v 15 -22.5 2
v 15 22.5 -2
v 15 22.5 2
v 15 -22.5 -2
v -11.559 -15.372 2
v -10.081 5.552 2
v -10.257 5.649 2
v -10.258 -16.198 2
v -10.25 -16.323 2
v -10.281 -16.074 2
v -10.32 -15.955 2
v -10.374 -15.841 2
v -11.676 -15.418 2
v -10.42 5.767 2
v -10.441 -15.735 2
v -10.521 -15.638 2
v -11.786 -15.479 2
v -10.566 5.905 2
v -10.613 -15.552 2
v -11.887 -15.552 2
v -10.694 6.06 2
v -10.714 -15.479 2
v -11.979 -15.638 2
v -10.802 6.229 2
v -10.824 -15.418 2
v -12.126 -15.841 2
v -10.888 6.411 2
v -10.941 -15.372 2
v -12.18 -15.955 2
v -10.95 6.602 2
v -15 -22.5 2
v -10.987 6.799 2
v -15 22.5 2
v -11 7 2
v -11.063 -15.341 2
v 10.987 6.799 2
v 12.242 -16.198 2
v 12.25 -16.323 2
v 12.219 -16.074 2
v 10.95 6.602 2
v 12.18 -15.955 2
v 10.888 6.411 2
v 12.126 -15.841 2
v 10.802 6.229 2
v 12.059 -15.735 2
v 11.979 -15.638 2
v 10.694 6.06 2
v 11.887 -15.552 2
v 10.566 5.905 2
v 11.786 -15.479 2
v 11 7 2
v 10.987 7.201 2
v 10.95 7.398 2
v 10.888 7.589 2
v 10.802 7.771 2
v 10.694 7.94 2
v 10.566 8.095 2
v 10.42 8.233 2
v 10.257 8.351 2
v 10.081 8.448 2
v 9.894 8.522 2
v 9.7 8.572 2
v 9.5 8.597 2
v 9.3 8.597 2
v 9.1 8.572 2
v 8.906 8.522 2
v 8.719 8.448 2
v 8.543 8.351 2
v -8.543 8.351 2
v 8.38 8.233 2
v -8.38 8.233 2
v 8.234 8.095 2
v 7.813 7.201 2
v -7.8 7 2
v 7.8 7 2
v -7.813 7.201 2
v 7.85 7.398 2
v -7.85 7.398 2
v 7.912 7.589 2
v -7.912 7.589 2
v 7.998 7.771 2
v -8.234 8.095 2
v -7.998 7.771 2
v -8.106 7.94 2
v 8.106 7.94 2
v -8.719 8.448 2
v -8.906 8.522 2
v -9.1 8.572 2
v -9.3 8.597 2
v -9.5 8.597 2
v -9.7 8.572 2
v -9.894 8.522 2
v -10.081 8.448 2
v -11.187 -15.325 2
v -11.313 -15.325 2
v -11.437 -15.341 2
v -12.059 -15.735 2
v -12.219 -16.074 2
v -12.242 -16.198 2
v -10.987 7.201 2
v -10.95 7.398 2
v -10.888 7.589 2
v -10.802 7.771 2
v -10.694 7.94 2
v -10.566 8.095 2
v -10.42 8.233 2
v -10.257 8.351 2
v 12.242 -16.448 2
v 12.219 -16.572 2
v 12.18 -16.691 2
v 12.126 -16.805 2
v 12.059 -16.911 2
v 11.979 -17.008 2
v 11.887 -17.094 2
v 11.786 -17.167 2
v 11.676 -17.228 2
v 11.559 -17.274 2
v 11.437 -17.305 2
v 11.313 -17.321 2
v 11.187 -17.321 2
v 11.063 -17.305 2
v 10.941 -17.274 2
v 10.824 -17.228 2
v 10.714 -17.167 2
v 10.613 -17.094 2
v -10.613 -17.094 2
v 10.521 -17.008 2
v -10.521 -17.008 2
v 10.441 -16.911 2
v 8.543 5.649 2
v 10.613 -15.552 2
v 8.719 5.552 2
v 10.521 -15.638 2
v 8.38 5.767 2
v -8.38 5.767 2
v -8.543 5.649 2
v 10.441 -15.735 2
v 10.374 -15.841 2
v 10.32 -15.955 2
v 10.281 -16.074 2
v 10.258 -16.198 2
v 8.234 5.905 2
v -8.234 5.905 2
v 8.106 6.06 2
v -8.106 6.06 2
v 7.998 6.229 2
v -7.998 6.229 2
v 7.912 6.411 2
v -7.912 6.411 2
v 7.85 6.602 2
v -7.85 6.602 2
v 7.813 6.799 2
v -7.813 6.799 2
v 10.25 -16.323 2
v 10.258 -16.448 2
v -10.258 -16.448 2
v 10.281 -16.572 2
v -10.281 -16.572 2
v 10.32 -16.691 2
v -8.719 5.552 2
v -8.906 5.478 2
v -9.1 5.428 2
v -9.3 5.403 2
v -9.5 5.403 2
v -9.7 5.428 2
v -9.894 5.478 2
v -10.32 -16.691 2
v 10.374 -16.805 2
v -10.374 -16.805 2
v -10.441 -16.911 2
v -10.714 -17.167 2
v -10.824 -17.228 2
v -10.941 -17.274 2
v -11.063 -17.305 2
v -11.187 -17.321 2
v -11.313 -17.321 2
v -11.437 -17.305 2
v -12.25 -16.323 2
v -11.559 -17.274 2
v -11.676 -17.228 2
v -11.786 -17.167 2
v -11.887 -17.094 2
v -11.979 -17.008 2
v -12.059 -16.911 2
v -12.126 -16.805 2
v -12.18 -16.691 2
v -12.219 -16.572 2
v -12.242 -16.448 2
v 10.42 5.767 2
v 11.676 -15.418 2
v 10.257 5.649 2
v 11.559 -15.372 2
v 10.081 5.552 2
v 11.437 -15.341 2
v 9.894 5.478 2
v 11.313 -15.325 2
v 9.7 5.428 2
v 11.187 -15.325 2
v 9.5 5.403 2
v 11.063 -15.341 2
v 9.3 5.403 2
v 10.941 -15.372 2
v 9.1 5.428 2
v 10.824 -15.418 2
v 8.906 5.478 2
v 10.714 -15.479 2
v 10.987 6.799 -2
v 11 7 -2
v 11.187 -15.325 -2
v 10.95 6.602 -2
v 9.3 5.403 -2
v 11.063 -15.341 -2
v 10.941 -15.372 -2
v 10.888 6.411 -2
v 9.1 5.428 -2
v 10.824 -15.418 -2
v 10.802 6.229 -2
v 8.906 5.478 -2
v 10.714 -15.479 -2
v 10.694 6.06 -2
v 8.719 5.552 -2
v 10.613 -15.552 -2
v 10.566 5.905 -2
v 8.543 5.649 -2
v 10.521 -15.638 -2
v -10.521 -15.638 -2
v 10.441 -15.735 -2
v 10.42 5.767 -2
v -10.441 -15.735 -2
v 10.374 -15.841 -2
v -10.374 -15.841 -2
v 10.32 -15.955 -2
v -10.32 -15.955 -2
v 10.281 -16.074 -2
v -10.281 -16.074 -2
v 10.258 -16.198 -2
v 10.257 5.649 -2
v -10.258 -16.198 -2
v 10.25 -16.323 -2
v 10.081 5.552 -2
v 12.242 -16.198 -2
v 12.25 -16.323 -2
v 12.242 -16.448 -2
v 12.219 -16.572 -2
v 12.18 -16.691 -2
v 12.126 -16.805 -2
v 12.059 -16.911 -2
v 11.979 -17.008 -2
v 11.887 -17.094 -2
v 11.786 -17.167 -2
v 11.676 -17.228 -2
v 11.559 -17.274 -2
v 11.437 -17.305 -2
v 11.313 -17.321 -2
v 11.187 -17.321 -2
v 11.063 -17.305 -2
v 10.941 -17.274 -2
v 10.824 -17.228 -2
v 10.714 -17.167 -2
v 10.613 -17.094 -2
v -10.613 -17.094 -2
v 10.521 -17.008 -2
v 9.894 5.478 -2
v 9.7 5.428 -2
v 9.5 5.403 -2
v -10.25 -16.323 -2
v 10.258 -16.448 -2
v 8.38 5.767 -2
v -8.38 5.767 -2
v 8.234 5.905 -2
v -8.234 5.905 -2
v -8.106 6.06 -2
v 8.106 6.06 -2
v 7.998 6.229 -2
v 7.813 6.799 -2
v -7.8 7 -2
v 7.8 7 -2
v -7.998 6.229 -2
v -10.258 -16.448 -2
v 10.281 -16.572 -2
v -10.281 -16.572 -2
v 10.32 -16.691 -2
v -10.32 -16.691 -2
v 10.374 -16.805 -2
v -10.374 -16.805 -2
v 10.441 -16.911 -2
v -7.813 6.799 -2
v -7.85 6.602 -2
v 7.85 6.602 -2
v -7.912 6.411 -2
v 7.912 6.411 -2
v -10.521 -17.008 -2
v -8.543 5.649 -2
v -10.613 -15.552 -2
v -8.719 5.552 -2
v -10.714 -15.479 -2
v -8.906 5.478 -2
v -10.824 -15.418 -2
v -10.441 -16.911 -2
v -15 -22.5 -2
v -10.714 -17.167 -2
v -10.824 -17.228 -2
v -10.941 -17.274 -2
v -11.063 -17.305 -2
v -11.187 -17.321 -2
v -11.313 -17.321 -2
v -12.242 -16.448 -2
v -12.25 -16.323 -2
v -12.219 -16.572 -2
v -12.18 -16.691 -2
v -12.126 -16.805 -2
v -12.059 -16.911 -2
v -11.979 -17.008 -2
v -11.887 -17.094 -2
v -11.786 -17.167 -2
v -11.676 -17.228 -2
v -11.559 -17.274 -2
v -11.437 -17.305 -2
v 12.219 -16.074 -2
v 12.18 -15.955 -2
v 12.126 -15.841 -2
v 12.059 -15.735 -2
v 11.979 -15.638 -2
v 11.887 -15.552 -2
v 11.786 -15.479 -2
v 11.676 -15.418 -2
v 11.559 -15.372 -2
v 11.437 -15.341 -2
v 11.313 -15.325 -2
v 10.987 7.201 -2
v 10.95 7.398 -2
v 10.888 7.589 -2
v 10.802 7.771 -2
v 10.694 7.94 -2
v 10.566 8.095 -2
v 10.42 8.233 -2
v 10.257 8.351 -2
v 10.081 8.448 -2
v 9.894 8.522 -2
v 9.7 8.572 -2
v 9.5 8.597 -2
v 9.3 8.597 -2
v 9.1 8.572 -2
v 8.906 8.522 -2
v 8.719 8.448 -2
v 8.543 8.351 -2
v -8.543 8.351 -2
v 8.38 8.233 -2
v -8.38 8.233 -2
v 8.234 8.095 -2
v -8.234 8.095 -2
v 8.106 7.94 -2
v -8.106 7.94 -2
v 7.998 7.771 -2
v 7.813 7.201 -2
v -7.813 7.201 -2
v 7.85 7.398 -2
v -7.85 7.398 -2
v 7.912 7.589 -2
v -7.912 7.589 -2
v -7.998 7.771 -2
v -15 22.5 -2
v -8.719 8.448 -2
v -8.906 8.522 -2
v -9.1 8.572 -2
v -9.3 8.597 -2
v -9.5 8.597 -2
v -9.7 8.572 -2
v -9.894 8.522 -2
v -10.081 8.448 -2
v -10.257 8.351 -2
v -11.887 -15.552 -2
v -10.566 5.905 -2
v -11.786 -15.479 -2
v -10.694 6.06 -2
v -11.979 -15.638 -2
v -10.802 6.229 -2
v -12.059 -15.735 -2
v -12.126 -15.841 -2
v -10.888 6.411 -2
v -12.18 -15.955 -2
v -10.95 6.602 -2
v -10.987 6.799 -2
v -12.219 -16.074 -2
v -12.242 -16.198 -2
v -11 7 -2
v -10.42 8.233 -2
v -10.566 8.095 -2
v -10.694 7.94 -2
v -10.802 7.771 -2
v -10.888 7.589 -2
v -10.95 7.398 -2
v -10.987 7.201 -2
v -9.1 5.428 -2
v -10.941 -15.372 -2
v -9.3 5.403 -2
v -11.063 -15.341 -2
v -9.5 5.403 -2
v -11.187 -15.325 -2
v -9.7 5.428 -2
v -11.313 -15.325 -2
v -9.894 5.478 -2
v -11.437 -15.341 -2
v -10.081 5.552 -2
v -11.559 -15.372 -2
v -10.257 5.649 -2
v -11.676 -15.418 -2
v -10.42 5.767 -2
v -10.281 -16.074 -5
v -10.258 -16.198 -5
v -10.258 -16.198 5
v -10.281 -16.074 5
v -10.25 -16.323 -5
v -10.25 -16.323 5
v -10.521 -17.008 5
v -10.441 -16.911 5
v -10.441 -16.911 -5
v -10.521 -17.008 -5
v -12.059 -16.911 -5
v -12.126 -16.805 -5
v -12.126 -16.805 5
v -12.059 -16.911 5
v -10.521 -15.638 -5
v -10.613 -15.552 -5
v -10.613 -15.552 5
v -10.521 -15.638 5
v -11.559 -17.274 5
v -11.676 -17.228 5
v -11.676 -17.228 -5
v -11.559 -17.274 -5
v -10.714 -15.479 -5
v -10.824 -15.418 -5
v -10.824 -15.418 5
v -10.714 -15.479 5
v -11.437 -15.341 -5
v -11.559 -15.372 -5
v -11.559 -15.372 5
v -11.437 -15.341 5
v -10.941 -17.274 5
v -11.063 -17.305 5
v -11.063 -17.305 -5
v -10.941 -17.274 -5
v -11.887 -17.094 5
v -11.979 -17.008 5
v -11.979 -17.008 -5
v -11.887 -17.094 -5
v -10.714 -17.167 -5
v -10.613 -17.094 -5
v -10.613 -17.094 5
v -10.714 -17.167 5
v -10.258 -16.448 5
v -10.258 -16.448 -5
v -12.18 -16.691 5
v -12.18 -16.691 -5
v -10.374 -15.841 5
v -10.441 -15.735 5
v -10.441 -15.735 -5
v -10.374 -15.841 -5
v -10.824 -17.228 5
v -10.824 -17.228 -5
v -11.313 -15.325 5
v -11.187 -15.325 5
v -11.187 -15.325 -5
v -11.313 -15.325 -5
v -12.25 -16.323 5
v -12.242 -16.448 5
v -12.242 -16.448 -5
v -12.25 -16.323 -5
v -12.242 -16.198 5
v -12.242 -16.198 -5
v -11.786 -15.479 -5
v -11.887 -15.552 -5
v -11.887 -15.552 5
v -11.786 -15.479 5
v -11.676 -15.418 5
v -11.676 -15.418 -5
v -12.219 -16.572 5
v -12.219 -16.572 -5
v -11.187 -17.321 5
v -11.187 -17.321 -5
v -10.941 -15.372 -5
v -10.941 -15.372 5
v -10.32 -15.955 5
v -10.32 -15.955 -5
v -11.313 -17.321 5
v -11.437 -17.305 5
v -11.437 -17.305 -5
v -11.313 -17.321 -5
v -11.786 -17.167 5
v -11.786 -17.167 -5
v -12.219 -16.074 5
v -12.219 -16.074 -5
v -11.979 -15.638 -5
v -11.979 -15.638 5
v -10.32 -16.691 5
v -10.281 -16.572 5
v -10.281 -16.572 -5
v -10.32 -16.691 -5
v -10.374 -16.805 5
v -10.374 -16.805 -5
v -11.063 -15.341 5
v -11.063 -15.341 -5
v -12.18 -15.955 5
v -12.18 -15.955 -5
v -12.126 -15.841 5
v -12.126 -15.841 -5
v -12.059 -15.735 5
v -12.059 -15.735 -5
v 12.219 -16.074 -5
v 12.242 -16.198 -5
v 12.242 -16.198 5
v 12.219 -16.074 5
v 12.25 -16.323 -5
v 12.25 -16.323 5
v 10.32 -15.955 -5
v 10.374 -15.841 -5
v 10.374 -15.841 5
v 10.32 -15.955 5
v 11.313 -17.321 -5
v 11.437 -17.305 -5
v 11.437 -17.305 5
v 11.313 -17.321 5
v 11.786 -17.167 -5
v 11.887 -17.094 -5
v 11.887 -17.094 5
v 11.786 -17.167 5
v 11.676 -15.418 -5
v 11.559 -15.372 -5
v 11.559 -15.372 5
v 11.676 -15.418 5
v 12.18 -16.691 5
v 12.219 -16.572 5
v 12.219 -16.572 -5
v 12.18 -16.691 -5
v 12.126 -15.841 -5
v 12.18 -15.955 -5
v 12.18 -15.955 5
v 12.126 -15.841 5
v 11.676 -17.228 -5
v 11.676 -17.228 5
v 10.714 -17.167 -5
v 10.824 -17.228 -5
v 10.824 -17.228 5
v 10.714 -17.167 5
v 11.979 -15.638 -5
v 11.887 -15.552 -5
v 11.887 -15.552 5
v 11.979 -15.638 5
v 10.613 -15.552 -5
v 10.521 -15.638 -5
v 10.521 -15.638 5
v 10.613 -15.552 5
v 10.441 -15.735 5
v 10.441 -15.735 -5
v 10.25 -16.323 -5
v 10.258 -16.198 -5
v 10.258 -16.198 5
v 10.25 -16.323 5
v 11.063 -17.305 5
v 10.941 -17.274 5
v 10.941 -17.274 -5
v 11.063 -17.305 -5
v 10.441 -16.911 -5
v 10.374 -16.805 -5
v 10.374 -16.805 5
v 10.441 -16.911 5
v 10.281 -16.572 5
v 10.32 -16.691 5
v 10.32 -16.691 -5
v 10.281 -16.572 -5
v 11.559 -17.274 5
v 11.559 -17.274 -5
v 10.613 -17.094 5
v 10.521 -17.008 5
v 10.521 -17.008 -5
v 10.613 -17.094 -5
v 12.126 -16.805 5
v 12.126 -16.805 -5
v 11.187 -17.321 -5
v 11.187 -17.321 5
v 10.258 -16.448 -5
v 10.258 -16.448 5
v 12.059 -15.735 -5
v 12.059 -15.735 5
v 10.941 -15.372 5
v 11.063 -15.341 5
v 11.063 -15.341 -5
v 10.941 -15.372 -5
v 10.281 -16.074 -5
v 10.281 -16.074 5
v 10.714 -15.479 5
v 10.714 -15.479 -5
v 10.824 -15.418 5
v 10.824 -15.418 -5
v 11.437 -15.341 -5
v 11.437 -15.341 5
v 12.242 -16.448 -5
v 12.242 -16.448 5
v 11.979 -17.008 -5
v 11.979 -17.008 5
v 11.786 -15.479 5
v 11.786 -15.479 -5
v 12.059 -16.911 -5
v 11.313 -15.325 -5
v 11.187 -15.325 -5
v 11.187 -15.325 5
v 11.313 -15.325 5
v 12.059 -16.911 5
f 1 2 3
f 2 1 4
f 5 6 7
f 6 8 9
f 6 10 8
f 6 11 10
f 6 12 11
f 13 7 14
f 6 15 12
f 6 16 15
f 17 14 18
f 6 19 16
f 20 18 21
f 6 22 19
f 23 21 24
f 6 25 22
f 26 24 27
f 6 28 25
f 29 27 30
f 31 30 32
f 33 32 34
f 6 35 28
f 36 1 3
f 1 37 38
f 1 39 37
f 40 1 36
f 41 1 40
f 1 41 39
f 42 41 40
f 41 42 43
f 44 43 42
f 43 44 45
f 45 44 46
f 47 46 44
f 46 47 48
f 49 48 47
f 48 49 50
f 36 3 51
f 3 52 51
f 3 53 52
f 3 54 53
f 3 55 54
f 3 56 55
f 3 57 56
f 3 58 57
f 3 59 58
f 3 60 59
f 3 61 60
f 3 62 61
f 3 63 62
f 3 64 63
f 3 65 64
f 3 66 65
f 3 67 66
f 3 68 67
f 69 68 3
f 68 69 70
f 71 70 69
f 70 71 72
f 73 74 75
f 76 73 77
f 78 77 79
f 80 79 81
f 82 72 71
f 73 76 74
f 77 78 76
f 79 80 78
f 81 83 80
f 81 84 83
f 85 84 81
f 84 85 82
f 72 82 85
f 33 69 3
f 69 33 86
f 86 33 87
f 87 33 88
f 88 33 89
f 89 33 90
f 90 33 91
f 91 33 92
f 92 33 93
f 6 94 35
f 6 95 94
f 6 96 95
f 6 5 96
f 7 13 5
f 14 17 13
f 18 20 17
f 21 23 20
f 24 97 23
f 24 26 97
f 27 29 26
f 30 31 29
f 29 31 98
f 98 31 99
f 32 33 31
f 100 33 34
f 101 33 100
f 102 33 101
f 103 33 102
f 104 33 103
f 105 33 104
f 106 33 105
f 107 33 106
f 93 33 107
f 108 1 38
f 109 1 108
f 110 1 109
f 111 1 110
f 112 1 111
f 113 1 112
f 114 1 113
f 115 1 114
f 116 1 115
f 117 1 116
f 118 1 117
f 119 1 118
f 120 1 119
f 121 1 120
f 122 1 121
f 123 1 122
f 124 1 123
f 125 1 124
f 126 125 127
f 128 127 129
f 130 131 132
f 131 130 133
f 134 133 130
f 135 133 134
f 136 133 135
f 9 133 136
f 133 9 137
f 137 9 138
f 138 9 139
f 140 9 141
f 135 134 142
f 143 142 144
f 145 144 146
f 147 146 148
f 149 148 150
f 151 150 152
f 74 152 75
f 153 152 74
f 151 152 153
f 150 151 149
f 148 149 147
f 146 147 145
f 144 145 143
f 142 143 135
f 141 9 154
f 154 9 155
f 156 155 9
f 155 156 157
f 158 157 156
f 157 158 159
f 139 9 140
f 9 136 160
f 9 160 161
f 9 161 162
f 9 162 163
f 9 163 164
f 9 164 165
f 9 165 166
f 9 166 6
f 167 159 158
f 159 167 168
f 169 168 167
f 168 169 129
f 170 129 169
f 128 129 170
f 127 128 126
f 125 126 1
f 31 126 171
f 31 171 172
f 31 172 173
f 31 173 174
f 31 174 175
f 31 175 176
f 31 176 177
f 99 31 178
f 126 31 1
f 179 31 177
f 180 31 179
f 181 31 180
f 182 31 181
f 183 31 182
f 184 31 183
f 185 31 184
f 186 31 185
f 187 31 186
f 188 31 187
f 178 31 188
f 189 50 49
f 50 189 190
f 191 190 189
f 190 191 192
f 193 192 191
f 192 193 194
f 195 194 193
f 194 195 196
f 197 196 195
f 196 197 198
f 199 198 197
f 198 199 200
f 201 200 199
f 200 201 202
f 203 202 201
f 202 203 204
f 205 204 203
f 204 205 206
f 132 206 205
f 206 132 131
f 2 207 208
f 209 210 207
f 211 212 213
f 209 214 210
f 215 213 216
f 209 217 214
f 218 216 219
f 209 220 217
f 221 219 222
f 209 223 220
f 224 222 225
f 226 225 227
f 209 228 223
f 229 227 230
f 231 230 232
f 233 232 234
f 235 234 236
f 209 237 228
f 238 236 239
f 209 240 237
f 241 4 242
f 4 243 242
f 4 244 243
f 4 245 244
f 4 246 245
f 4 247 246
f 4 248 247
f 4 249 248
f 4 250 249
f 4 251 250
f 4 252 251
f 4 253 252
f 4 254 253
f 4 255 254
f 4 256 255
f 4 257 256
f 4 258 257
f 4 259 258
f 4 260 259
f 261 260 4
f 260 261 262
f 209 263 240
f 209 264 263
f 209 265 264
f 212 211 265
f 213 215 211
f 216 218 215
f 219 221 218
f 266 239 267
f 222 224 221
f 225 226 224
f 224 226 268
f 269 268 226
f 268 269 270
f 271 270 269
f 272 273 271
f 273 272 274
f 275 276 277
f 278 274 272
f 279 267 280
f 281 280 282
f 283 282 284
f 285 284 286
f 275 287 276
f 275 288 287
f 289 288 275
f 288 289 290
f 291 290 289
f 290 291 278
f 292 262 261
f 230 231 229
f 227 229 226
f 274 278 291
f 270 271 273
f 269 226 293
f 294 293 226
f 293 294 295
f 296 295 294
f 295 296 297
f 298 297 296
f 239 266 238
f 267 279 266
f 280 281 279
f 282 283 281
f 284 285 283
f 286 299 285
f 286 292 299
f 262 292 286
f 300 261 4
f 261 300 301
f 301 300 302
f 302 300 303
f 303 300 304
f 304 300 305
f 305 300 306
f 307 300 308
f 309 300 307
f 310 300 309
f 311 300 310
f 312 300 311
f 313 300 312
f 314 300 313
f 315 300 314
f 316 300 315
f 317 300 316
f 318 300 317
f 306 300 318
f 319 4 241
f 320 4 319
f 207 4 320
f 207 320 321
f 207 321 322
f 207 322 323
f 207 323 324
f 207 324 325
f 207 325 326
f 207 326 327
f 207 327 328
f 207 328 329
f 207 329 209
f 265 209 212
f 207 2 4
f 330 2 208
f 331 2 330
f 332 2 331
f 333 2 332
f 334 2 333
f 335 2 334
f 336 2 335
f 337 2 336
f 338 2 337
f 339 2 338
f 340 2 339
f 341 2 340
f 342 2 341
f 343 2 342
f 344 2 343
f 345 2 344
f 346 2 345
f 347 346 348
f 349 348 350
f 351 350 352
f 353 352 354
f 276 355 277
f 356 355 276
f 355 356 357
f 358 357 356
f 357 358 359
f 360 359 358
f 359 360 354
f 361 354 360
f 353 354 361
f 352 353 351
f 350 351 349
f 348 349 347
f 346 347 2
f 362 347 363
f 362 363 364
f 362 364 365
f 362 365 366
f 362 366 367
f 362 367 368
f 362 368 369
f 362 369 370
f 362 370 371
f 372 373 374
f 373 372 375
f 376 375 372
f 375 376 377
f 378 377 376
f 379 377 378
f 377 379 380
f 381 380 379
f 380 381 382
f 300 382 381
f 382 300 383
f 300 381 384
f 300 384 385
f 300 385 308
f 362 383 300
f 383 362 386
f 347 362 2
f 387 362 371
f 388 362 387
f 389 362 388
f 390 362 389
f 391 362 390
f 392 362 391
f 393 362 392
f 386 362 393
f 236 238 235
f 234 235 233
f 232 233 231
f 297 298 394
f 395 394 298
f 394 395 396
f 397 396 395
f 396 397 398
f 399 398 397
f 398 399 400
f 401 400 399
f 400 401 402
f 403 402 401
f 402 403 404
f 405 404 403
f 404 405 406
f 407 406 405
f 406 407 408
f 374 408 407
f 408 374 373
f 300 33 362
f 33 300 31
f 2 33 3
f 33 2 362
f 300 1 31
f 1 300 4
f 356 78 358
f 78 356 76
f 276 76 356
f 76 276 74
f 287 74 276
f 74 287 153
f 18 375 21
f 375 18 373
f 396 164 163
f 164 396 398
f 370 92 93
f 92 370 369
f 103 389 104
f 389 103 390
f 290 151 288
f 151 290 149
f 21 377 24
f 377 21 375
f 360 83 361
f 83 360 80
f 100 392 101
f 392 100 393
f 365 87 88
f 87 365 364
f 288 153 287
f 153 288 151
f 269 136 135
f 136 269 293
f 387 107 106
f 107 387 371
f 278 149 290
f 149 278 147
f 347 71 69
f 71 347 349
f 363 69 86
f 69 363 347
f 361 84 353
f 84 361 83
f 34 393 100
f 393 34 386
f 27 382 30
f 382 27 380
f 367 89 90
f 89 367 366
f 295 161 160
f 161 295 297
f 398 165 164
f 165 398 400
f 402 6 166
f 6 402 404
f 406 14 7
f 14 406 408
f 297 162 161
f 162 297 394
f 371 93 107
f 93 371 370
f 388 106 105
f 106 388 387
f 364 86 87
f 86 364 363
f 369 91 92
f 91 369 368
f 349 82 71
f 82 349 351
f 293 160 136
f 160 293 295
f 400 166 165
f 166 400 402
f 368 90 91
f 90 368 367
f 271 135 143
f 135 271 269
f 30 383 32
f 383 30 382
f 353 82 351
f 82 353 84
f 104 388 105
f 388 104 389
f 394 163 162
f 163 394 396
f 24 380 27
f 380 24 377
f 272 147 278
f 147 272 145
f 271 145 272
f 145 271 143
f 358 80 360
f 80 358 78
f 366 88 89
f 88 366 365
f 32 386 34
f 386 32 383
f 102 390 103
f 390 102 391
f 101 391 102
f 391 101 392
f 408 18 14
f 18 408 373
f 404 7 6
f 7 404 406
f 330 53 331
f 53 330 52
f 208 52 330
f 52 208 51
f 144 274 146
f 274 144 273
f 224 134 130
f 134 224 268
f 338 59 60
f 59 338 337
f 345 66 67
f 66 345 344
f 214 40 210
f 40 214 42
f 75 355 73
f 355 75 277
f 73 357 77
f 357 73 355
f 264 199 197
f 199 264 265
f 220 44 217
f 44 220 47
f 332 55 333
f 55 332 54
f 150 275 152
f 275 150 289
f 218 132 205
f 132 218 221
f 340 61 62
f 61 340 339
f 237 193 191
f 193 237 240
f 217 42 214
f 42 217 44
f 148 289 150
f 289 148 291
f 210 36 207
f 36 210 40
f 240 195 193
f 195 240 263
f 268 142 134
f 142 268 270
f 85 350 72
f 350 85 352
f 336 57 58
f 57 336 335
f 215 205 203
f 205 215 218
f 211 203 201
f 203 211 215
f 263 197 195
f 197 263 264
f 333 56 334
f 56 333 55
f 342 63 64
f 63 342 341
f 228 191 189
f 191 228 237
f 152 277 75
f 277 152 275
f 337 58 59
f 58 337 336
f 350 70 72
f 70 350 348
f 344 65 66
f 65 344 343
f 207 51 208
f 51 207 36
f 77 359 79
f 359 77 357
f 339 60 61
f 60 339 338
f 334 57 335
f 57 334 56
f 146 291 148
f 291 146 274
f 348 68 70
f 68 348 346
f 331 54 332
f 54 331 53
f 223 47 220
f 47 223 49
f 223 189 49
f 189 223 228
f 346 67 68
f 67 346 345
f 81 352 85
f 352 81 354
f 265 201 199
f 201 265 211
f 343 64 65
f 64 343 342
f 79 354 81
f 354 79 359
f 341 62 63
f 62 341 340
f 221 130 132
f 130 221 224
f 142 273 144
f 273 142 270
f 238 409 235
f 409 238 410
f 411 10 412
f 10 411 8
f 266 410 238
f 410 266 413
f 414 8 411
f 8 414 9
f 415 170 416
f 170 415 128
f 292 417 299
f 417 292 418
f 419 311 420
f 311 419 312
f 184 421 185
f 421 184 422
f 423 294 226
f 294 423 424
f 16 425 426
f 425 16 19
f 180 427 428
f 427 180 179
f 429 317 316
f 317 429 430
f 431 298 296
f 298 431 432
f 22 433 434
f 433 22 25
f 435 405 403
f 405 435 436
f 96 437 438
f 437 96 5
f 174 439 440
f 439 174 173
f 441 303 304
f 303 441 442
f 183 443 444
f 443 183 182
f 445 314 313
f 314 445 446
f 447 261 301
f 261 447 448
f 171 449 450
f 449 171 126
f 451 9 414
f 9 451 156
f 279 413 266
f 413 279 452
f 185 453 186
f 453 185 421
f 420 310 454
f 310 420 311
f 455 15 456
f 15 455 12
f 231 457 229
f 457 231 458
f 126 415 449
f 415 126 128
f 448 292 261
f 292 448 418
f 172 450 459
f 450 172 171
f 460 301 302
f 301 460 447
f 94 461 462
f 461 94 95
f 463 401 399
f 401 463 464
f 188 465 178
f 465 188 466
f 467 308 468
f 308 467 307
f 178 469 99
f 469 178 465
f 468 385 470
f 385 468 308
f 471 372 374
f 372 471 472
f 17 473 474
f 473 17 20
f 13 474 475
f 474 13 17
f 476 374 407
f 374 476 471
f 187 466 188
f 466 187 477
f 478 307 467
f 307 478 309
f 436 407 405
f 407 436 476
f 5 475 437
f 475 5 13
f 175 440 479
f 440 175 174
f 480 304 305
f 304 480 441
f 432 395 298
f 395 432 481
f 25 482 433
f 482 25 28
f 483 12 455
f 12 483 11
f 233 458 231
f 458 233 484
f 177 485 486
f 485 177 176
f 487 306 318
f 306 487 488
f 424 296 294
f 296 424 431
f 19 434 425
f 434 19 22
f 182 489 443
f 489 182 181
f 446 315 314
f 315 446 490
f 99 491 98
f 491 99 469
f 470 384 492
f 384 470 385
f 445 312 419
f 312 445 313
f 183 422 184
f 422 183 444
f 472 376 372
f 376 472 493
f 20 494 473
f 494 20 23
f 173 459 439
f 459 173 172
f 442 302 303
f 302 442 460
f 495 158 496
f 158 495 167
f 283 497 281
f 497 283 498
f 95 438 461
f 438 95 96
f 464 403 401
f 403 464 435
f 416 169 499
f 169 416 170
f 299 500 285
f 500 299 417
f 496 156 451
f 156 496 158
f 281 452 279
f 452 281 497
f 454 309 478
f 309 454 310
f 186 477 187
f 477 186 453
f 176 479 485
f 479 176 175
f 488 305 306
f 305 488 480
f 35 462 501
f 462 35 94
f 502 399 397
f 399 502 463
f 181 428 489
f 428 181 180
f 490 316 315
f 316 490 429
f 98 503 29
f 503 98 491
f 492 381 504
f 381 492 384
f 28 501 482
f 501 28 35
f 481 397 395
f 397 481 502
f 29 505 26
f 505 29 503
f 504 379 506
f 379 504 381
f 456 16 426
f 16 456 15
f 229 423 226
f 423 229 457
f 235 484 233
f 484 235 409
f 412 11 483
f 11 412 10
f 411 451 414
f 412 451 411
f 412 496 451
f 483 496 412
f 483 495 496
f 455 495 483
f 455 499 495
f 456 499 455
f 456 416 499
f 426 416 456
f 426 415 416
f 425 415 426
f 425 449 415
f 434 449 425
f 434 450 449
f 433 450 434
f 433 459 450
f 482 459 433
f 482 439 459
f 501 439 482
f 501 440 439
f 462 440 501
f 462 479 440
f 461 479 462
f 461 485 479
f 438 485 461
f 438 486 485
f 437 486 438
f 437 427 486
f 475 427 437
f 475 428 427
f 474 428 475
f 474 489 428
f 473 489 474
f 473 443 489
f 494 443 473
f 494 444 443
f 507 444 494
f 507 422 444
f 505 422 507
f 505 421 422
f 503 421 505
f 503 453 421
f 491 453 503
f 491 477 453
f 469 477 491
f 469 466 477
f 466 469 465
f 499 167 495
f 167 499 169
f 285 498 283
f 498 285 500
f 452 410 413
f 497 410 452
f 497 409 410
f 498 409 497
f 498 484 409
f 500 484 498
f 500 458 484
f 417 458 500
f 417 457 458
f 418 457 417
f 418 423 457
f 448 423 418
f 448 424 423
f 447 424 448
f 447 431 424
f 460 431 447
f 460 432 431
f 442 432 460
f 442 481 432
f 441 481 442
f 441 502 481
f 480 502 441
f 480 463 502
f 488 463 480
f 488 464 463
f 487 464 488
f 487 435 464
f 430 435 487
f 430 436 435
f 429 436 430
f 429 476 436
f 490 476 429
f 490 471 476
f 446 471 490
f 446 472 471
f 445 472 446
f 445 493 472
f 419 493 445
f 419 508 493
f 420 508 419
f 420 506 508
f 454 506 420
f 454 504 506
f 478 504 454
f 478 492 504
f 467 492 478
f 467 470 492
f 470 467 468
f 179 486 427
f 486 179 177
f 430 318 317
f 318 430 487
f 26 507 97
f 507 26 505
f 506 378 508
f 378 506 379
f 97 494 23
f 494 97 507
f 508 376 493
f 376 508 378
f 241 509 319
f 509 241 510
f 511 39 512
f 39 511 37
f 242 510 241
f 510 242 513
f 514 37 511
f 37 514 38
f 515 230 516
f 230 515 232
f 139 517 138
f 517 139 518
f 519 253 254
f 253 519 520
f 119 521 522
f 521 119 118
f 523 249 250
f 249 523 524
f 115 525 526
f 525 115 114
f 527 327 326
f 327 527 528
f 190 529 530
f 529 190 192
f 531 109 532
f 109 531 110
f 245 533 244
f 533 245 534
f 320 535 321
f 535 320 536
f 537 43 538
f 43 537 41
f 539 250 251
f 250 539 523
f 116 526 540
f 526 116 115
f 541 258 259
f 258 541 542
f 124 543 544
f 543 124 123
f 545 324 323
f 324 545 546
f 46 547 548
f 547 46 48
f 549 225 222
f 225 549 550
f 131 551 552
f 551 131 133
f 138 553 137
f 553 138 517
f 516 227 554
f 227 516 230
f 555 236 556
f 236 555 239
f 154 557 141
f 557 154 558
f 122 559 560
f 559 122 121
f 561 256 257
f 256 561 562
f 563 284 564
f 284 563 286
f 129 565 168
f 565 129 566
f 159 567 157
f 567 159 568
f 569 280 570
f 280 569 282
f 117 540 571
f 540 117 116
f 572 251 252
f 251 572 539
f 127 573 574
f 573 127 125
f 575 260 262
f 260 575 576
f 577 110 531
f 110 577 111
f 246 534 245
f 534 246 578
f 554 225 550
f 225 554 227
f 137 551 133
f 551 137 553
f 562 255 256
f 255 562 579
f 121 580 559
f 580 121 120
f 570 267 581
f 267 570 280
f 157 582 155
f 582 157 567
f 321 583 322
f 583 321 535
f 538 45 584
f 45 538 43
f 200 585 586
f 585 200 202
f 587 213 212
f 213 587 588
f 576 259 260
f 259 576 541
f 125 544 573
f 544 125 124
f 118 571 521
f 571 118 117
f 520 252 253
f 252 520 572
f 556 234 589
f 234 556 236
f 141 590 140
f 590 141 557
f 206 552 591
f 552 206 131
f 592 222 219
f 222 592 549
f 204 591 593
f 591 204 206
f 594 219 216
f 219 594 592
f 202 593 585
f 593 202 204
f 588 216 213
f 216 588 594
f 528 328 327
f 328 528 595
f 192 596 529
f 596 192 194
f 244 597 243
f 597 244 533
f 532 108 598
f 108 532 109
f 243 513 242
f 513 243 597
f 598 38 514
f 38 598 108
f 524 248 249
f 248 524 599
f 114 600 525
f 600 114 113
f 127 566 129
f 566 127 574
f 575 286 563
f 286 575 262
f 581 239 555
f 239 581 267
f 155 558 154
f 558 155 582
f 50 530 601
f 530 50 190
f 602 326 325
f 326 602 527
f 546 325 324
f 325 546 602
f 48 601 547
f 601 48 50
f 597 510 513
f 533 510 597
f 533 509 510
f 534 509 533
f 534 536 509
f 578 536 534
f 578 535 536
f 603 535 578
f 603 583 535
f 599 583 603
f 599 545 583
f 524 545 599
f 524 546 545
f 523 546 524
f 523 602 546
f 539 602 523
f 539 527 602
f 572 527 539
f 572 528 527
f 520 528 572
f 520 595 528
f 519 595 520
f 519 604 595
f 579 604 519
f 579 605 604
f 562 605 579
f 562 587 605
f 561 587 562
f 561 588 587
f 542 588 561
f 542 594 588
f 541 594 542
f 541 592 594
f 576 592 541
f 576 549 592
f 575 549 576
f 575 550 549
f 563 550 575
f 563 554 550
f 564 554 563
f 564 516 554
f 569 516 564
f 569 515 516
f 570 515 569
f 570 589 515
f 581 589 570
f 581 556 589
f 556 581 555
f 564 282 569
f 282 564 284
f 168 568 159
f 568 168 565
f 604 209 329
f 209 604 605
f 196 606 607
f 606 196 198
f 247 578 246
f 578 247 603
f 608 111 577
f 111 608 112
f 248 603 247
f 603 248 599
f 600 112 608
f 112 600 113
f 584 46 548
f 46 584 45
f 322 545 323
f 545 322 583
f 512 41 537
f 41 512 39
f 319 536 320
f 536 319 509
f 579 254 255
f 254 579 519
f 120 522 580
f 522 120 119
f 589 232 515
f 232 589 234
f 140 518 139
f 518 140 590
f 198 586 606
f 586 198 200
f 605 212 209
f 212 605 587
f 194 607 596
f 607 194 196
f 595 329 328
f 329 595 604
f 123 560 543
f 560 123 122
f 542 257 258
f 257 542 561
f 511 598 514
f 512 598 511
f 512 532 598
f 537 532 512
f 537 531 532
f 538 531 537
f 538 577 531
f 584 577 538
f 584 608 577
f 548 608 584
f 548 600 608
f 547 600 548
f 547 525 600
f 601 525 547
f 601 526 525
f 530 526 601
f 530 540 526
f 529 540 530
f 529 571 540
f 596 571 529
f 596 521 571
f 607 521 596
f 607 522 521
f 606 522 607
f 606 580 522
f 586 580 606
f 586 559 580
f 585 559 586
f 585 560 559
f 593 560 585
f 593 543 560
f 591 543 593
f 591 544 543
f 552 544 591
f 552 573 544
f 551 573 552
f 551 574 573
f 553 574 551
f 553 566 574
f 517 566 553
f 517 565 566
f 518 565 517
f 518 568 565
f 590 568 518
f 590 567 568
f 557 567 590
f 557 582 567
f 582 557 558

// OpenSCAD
// RMR footprint mount plate - OpenSCAD model
// Units: mm

$fs=200;
$fn=50;


plate_length = 45;
plate_width = 30;
plate_thickness = 4;
screw_hole_diameter = 3.2;
pin_hole_diameter = 2.0;

screw_spacing_x = 18.8;
screw_offset_y = 7.0; // odległość od środka płyty
pin_spacing_x = 22.5;

pin_to_screws=23.323;
pin_offset_y = screw_offset_y - pin_to_screws;

module rmr_plate() {
    difference() {
        // Base plate
        cube([plate_width,plate_length, plate_thickness], center=true);

        // Screw holes (M3 or #6-32)
        translate([-screw_spacing_x/2, screw_offset_y, 0])
            cylinder(h=10, d=screw_hole_diameter, center=true);
        
        translate([ screw_spacing_x/2, screw_offset_y, 0])
            cylinder(h=10, d=screw_hole_diameter, center=true);

  
    }
          // Pin holes (optional)
        translate([-pin_spacing_x/2, pin_offset_y, 0])
            cylinder(h=10, d=pin_hole_diameter, center=true);
        translate([ pin_spacing_x/2, pin_offset_y, 0])
            cylinder(h=10, d=pin_hole_diameter, center=true);
}

rmr_plate();
